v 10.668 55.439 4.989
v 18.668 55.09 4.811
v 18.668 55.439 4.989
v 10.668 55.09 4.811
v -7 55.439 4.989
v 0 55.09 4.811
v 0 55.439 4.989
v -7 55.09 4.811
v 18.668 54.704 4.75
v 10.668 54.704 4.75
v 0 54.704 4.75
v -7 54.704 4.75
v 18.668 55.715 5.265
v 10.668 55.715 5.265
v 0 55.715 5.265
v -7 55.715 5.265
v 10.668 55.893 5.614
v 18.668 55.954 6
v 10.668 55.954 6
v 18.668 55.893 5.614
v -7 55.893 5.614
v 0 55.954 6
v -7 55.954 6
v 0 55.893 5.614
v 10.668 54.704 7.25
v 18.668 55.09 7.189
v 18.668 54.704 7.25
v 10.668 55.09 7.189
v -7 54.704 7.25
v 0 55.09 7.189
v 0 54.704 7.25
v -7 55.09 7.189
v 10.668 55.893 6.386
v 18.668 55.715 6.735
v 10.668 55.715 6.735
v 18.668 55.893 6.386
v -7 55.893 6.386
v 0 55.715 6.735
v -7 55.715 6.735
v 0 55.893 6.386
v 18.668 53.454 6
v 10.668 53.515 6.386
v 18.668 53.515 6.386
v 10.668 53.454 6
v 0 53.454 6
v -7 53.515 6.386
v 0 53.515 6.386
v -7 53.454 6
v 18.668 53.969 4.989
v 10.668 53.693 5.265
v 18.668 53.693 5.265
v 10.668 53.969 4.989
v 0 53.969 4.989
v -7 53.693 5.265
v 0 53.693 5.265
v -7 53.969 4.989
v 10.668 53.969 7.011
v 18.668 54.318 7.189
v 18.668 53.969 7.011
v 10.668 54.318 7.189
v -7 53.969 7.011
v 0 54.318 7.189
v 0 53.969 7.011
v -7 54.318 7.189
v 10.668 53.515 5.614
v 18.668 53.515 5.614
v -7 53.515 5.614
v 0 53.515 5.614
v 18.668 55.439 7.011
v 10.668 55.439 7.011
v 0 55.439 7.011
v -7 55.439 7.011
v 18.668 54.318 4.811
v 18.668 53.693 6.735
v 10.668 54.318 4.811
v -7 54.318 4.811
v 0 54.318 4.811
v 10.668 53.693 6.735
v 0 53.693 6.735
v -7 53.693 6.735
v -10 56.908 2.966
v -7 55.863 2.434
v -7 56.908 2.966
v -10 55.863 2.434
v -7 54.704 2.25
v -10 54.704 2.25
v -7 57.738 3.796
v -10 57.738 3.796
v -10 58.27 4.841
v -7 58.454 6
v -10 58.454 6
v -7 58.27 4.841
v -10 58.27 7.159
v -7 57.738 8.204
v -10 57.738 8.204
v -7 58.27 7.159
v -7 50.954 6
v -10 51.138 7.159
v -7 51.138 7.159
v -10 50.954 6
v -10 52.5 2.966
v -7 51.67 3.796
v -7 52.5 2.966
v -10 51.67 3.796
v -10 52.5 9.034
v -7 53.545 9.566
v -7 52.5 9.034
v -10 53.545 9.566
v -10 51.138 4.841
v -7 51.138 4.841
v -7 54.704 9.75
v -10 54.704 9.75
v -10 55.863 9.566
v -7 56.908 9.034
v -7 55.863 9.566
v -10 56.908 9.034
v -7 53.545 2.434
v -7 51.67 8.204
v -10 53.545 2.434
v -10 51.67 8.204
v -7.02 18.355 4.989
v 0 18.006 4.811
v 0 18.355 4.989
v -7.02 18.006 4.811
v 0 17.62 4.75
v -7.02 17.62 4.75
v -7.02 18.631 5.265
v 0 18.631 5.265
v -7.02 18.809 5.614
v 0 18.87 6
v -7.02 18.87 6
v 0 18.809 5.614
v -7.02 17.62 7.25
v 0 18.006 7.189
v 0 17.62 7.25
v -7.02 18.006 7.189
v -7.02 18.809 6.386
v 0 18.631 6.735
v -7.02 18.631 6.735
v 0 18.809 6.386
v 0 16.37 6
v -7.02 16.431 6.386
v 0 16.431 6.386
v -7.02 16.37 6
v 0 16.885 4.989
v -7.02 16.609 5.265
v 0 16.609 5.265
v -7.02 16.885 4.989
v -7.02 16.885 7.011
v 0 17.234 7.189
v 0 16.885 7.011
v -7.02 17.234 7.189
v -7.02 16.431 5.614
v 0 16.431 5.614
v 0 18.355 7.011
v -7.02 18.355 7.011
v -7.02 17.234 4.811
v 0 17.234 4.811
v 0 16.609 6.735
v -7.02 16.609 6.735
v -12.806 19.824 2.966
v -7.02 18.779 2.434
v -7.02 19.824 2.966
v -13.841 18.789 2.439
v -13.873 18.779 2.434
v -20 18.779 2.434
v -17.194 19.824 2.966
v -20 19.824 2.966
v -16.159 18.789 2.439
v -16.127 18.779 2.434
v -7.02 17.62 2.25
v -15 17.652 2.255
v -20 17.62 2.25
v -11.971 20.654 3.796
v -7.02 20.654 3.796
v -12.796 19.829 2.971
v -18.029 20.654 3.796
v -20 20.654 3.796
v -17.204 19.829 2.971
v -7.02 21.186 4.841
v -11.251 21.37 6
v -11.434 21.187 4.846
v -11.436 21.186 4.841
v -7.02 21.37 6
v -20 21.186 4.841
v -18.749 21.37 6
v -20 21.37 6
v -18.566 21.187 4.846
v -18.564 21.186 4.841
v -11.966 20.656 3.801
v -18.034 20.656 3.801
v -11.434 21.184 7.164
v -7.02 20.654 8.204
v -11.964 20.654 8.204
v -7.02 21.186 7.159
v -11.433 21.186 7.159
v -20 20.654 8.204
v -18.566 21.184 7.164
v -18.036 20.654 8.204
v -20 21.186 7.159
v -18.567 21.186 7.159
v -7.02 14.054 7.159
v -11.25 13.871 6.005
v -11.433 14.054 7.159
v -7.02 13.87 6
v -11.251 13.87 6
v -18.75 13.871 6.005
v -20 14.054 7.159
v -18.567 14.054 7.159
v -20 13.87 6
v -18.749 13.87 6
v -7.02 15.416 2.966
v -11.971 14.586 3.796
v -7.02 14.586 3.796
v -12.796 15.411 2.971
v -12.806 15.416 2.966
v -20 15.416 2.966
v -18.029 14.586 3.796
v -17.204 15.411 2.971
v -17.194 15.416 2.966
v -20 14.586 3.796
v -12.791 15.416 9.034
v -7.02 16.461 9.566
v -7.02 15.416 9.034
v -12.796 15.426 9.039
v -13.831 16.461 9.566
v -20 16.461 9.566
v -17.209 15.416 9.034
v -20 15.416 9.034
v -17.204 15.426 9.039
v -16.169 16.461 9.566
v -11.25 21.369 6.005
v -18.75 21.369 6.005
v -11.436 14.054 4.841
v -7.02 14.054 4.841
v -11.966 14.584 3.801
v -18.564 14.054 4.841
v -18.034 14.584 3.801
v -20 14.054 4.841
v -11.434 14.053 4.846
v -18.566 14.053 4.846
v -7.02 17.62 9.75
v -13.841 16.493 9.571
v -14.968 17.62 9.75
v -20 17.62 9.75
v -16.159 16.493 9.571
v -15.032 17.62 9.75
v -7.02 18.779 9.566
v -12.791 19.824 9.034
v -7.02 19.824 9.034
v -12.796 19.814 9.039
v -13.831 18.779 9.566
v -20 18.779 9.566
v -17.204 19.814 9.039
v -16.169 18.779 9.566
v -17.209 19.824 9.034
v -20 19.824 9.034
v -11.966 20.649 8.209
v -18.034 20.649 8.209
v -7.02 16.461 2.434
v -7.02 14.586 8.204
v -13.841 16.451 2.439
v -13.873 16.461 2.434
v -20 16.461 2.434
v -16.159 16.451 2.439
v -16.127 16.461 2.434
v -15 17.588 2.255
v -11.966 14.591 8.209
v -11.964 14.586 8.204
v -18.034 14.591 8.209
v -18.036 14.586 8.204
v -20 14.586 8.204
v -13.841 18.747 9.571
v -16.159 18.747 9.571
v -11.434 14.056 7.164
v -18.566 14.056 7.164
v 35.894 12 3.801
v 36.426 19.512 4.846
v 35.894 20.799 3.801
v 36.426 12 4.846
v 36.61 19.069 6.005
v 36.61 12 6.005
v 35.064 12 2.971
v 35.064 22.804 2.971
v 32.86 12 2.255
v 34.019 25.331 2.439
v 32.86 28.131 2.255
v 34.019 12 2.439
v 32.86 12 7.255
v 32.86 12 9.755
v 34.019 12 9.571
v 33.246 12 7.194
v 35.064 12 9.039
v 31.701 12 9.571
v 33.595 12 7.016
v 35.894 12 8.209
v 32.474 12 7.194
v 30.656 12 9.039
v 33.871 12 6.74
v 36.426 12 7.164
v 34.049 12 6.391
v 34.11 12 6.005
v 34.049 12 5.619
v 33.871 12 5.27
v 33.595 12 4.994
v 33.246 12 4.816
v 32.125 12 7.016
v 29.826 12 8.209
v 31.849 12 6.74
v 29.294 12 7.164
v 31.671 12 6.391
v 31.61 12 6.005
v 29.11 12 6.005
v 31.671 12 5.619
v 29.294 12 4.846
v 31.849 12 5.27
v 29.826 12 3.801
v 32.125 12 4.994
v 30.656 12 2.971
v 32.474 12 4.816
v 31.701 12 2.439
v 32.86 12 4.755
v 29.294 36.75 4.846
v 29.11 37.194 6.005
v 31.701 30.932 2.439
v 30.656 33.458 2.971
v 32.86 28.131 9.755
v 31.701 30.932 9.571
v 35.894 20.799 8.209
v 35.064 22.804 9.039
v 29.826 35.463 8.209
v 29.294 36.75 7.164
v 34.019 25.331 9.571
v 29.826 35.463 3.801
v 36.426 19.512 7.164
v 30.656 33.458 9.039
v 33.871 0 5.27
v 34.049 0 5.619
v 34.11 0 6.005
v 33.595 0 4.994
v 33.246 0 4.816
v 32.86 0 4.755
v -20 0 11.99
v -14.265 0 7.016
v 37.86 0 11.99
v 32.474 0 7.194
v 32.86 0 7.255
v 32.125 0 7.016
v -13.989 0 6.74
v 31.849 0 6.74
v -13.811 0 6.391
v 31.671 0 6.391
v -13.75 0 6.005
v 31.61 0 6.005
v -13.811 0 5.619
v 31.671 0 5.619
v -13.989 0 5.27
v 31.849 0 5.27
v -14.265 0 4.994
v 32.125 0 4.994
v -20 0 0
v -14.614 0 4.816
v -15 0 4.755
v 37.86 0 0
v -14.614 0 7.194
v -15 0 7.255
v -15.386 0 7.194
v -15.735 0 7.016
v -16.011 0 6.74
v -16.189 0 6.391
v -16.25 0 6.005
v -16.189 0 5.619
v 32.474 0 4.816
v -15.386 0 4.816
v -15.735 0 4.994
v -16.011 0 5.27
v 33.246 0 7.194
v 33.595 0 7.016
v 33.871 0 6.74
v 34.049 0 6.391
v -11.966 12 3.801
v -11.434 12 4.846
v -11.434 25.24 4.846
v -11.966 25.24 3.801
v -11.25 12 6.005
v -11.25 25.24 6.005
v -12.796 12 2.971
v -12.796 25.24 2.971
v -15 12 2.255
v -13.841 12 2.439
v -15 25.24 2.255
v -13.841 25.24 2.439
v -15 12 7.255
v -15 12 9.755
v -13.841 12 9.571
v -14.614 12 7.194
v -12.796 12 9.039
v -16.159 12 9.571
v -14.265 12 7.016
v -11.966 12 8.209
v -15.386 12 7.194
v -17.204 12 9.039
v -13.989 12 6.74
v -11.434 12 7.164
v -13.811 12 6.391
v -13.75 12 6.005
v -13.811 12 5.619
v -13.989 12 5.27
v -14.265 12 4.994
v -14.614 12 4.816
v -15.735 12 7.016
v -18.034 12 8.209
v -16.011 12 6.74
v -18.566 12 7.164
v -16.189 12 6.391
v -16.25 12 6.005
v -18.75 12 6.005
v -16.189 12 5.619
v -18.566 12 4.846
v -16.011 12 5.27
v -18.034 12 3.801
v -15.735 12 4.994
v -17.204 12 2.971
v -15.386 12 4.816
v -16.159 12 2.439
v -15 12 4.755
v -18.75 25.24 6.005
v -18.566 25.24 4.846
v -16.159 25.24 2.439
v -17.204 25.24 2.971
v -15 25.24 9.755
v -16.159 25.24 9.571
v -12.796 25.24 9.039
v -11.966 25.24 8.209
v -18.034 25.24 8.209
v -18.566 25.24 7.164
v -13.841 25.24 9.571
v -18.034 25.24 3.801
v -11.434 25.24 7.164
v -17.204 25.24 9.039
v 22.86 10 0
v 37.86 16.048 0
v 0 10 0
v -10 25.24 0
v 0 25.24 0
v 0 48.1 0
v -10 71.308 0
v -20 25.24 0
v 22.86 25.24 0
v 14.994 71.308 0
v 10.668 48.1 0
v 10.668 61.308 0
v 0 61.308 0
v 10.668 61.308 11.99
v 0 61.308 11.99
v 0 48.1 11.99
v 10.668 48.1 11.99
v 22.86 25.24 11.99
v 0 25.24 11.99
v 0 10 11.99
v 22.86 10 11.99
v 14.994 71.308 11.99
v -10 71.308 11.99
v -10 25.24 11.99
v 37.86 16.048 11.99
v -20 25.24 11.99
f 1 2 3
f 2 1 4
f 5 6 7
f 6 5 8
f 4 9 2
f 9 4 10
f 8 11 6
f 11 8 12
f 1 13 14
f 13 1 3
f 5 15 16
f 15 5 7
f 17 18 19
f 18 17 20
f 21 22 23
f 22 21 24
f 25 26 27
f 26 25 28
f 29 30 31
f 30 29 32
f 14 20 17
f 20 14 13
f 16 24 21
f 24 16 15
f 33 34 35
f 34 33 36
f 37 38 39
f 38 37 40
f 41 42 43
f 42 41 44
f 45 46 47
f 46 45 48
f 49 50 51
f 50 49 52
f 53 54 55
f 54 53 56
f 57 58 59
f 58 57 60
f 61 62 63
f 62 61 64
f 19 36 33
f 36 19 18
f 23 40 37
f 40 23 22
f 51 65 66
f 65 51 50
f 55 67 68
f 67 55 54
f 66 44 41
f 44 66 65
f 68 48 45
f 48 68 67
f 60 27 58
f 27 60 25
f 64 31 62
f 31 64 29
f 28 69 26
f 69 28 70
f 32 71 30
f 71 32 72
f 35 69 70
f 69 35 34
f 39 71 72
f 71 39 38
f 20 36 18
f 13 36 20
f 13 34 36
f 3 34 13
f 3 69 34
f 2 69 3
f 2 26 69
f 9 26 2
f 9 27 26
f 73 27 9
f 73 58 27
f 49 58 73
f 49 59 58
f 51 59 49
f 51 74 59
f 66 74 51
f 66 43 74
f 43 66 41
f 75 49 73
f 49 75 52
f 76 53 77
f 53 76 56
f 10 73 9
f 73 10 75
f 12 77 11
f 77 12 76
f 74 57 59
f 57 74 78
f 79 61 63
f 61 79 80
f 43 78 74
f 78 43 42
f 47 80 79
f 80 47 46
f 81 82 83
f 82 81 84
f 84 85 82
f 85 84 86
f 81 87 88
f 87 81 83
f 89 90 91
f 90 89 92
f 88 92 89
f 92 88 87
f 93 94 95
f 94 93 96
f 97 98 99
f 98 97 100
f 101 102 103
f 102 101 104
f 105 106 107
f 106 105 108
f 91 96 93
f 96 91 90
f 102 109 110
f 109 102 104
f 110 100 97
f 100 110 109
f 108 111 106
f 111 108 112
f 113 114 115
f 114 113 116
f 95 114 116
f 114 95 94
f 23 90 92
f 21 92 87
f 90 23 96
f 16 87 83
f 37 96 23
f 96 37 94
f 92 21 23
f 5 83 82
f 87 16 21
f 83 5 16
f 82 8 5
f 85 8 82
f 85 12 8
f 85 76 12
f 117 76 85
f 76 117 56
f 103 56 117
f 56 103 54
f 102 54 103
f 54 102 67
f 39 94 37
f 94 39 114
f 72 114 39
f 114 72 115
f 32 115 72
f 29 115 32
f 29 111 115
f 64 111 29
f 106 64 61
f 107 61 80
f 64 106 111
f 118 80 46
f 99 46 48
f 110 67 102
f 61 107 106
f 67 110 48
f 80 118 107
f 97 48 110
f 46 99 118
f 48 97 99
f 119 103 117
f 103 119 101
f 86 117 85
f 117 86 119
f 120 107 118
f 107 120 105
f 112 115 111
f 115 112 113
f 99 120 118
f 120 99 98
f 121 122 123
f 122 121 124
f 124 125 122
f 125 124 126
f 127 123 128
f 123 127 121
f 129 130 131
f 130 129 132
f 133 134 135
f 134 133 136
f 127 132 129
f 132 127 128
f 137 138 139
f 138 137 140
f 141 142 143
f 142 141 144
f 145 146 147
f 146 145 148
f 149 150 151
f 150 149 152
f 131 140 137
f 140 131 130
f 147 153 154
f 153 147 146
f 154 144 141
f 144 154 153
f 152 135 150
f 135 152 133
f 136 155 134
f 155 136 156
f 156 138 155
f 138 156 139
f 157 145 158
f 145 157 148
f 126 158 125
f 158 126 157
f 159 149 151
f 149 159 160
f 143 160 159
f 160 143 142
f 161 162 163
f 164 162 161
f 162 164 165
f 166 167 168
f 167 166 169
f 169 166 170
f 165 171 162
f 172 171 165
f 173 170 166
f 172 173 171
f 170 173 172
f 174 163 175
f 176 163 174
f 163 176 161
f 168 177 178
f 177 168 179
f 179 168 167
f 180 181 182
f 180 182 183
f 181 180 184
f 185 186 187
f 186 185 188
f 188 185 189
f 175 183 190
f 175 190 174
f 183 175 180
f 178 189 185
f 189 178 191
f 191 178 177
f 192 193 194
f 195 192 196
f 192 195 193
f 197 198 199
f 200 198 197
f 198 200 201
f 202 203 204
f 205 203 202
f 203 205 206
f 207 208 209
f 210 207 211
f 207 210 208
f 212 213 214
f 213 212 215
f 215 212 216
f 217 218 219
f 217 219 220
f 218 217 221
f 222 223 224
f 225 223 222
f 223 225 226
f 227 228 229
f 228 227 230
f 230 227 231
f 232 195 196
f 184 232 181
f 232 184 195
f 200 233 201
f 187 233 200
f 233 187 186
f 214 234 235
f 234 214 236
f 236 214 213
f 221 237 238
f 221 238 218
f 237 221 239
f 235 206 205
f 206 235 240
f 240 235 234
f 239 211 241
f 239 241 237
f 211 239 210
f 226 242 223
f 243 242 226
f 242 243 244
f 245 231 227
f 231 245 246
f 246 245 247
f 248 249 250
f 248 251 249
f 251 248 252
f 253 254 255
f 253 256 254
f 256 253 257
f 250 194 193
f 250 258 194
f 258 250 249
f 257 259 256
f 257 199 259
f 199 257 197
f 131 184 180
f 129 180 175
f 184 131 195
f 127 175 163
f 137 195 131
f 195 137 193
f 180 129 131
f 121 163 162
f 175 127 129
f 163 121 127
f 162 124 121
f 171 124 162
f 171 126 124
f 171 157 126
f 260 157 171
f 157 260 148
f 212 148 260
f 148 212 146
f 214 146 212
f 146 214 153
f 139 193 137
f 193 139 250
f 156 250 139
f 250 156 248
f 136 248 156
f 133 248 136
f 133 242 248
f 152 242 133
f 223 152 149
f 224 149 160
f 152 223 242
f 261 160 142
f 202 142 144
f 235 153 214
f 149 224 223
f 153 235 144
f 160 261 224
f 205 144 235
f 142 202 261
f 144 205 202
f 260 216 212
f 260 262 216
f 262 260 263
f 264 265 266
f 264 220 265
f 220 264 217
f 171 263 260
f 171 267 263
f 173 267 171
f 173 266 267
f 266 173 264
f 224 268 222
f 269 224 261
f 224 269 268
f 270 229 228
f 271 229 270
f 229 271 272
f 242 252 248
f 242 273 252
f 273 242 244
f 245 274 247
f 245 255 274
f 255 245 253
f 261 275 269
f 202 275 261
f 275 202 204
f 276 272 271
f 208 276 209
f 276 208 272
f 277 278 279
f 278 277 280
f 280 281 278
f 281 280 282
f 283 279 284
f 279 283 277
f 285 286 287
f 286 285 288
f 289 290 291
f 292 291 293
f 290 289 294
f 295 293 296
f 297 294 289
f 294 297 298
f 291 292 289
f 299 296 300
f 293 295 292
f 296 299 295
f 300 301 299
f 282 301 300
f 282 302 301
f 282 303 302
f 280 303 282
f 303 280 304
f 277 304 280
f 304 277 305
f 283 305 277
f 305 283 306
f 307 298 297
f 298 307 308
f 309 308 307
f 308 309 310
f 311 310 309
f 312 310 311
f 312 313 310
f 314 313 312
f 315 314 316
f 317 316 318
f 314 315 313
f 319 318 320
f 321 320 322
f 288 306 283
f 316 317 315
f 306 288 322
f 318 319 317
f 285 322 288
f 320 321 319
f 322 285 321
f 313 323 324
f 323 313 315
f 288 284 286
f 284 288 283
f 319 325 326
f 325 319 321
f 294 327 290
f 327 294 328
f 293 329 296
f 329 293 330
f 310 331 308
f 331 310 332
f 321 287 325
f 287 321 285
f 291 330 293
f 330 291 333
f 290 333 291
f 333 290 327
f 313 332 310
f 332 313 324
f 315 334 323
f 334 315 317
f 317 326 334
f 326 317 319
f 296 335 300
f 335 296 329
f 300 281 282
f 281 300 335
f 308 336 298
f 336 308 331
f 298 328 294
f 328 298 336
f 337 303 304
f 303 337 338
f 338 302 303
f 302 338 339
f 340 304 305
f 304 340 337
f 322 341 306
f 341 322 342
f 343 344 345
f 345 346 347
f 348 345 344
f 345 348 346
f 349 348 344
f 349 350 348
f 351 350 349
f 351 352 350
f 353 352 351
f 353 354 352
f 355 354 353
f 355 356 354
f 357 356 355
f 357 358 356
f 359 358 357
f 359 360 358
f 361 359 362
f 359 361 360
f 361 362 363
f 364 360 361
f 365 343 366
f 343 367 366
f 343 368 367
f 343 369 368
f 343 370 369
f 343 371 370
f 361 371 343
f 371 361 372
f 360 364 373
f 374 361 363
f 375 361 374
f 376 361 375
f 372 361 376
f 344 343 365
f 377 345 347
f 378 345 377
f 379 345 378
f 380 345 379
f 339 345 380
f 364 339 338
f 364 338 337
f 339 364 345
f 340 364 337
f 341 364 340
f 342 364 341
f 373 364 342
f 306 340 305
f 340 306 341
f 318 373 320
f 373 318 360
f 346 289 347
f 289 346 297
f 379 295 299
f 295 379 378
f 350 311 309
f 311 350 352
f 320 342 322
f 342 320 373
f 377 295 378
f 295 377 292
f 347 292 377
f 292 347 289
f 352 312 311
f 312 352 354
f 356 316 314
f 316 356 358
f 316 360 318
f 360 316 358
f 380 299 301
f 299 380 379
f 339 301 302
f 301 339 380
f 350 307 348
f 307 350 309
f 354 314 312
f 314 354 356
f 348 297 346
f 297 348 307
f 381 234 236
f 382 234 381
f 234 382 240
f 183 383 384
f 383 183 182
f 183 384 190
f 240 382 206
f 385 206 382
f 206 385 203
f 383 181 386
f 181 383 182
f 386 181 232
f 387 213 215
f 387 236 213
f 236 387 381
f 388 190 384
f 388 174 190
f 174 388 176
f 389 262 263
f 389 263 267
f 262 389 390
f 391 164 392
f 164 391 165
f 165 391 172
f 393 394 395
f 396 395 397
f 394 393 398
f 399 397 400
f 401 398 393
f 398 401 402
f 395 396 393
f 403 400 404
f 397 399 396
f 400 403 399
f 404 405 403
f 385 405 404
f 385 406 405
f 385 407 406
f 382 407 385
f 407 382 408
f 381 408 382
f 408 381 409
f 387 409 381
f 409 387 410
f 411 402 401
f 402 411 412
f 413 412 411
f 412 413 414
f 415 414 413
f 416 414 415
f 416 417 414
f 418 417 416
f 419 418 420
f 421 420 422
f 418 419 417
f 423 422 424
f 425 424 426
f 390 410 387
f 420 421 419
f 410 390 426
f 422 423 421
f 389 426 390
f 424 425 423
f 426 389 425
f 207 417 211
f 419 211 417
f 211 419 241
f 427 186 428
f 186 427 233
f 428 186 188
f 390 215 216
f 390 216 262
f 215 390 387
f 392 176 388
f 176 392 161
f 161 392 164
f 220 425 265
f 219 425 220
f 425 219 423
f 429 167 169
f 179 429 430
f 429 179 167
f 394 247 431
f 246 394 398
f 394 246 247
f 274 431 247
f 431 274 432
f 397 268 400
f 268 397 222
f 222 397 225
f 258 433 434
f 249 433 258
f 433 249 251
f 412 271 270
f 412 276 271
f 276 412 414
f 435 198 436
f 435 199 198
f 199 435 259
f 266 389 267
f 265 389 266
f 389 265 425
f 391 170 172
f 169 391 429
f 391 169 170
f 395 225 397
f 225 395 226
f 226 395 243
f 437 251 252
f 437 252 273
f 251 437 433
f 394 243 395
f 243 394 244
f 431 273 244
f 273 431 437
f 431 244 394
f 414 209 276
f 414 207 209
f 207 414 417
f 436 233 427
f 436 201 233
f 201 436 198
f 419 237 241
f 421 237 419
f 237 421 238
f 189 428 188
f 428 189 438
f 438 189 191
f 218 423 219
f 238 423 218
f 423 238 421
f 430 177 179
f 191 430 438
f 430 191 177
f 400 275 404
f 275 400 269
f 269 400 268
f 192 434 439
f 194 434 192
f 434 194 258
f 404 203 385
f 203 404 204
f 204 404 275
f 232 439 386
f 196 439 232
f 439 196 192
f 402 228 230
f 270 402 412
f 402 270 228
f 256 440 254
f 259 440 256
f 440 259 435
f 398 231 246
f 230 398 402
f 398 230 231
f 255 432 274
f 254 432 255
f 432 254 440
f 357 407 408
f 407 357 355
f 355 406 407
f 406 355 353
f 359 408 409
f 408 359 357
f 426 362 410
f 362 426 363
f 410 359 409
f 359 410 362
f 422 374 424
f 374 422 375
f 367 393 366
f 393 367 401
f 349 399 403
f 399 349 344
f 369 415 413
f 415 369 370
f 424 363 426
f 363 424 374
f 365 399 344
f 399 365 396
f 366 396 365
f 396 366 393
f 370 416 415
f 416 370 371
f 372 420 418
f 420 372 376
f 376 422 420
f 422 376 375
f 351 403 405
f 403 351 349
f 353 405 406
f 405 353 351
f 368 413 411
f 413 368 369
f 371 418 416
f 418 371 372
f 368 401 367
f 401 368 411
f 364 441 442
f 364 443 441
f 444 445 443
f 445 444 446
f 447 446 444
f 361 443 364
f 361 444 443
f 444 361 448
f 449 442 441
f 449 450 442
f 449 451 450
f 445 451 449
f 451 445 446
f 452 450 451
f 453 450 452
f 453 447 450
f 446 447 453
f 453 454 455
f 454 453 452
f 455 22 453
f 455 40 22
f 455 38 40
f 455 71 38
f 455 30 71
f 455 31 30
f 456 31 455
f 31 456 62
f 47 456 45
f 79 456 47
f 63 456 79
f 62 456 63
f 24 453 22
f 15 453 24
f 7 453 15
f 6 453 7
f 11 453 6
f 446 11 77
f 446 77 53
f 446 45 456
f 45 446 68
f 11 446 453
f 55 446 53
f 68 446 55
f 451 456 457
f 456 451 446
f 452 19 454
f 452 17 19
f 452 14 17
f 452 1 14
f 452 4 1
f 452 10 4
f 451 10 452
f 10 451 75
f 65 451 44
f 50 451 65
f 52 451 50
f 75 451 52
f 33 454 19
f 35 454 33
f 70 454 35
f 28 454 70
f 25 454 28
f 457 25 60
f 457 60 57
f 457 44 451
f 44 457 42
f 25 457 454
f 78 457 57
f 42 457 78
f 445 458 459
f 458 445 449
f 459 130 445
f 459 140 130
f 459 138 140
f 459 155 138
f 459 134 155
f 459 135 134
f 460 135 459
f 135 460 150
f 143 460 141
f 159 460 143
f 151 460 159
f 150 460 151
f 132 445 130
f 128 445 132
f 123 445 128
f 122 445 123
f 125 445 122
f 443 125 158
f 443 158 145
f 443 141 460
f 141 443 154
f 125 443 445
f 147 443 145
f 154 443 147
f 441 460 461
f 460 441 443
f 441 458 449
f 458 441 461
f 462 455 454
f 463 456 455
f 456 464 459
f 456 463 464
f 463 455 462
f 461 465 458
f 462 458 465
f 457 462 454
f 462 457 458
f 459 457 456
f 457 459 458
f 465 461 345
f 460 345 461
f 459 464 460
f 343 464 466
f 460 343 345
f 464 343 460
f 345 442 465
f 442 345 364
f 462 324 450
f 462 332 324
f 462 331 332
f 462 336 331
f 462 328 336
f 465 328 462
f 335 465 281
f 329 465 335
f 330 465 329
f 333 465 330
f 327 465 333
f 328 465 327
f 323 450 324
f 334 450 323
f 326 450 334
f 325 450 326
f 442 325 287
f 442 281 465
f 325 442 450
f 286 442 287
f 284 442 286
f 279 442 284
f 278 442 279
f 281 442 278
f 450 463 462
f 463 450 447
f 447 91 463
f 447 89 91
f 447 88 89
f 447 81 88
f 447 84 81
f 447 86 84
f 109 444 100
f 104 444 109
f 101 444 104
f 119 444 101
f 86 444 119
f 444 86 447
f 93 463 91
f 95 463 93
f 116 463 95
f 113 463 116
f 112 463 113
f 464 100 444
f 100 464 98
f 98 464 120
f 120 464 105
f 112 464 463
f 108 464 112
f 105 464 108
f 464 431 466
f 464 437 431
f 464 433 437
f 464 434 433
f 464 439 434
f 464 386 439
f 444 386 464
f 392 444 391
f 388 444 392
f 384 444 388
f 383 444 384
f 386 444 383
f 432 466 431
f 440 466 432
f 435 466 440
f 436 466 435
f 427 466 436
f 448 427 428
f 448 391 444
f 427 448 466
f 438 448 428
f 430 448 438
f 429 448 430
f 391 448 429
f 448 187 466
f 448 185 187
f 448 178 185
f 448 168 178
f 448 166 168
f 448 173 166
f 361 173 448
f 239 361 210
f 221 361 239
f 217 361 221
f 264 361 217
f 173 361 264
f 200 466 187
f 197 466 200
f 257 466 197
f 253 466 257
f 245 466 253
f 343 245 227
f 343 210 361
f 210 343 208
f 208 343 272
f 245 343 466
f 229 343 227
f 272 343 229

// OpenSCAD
// RMC Power Rail Insulator

$fn = 20;
inch=25.4; // mm per inch

// Variables
pwrW = 0.42*inch; // + rail (little top rail)
pwrH = 0.52*inch;
gndW = 0.9*inch; // - rail (big lower rail)
gndH = 0.6*inch;

btsH = 0.9*inch; // BTS motor controller height (rail-rail clearance)

hole = 2.5; // M3 thread diameter (can be tapped or clearance drilled)
boltHead = 7.5; // M3 cap screw head diameter + clearance

thick = 12; // Z thickness
wall=10;  // XY padding around sides
eps = 0.01;
capWall = -eps; 

difference(){
// Block
translate([0,0,-capWall-eps])
linear_extrude(height = thick+capWall, convexity=4){
  difference(){
    translate([-2*wall,0])
    square([7/2*wall+gndW,2*wall+btsH+pwrH+gndH]);
    
    translate([-2*wall, wall+gndH])
    square([wall,btsH+wall+pwrH]);
    
    translate([gndW,-eps])
    rotate([0,0,atan((gndW-pwrW)/(pwrH/2+btsH))])
    translate([2*wall,-wall])
    square([thick*3,3*thick+pwrH+gndH+btsH+2*eps]);
  }
}
union(){
//Holes
linear_extrude(height = thick+eps){
  translate([0,wall+gndH+btsH])
  square([pwrW,pwrH]);
  translate([0,wall])
  square([gndW, gndH]);
}

// PWR screw
rotate([0,90,0])
translate([-thick/2,wall+gndH+btsH+pwrH/2,-thick]){
cylinder(d=hole,h=2*wall+pwrW);
translate([0,0,-wall])
cylinder(d=boltHead,h=wall*3/2);  
}

// GND screw
rotate([0,90,0])
translate([-thick/2,wall+gndH/2,-thick]){
cylinder(d=hole,h=wall+gndW);
  translate([0,0,-wall-eps*2])
cylinder(d=boltHead,h=wall*3/2);
}

// Base screws
rotate([-90,0,0])
translate([gndW+wall,-(thick-capWall)/2,]){
  translate([0,0,thick])
cylinder(d=boltHead,h=wall*5);
cylinder(d=hole,h=wall+gndH);
}
rotate([-90,0,0])
translate([-3*wall/2,-(thick-capWall)/2,]){
  translate([0,0,thick])
cylinder(d=boltHead,h=wall*3/2);
cylinder(d=hole,h=wall+gndH);
}
}

}
